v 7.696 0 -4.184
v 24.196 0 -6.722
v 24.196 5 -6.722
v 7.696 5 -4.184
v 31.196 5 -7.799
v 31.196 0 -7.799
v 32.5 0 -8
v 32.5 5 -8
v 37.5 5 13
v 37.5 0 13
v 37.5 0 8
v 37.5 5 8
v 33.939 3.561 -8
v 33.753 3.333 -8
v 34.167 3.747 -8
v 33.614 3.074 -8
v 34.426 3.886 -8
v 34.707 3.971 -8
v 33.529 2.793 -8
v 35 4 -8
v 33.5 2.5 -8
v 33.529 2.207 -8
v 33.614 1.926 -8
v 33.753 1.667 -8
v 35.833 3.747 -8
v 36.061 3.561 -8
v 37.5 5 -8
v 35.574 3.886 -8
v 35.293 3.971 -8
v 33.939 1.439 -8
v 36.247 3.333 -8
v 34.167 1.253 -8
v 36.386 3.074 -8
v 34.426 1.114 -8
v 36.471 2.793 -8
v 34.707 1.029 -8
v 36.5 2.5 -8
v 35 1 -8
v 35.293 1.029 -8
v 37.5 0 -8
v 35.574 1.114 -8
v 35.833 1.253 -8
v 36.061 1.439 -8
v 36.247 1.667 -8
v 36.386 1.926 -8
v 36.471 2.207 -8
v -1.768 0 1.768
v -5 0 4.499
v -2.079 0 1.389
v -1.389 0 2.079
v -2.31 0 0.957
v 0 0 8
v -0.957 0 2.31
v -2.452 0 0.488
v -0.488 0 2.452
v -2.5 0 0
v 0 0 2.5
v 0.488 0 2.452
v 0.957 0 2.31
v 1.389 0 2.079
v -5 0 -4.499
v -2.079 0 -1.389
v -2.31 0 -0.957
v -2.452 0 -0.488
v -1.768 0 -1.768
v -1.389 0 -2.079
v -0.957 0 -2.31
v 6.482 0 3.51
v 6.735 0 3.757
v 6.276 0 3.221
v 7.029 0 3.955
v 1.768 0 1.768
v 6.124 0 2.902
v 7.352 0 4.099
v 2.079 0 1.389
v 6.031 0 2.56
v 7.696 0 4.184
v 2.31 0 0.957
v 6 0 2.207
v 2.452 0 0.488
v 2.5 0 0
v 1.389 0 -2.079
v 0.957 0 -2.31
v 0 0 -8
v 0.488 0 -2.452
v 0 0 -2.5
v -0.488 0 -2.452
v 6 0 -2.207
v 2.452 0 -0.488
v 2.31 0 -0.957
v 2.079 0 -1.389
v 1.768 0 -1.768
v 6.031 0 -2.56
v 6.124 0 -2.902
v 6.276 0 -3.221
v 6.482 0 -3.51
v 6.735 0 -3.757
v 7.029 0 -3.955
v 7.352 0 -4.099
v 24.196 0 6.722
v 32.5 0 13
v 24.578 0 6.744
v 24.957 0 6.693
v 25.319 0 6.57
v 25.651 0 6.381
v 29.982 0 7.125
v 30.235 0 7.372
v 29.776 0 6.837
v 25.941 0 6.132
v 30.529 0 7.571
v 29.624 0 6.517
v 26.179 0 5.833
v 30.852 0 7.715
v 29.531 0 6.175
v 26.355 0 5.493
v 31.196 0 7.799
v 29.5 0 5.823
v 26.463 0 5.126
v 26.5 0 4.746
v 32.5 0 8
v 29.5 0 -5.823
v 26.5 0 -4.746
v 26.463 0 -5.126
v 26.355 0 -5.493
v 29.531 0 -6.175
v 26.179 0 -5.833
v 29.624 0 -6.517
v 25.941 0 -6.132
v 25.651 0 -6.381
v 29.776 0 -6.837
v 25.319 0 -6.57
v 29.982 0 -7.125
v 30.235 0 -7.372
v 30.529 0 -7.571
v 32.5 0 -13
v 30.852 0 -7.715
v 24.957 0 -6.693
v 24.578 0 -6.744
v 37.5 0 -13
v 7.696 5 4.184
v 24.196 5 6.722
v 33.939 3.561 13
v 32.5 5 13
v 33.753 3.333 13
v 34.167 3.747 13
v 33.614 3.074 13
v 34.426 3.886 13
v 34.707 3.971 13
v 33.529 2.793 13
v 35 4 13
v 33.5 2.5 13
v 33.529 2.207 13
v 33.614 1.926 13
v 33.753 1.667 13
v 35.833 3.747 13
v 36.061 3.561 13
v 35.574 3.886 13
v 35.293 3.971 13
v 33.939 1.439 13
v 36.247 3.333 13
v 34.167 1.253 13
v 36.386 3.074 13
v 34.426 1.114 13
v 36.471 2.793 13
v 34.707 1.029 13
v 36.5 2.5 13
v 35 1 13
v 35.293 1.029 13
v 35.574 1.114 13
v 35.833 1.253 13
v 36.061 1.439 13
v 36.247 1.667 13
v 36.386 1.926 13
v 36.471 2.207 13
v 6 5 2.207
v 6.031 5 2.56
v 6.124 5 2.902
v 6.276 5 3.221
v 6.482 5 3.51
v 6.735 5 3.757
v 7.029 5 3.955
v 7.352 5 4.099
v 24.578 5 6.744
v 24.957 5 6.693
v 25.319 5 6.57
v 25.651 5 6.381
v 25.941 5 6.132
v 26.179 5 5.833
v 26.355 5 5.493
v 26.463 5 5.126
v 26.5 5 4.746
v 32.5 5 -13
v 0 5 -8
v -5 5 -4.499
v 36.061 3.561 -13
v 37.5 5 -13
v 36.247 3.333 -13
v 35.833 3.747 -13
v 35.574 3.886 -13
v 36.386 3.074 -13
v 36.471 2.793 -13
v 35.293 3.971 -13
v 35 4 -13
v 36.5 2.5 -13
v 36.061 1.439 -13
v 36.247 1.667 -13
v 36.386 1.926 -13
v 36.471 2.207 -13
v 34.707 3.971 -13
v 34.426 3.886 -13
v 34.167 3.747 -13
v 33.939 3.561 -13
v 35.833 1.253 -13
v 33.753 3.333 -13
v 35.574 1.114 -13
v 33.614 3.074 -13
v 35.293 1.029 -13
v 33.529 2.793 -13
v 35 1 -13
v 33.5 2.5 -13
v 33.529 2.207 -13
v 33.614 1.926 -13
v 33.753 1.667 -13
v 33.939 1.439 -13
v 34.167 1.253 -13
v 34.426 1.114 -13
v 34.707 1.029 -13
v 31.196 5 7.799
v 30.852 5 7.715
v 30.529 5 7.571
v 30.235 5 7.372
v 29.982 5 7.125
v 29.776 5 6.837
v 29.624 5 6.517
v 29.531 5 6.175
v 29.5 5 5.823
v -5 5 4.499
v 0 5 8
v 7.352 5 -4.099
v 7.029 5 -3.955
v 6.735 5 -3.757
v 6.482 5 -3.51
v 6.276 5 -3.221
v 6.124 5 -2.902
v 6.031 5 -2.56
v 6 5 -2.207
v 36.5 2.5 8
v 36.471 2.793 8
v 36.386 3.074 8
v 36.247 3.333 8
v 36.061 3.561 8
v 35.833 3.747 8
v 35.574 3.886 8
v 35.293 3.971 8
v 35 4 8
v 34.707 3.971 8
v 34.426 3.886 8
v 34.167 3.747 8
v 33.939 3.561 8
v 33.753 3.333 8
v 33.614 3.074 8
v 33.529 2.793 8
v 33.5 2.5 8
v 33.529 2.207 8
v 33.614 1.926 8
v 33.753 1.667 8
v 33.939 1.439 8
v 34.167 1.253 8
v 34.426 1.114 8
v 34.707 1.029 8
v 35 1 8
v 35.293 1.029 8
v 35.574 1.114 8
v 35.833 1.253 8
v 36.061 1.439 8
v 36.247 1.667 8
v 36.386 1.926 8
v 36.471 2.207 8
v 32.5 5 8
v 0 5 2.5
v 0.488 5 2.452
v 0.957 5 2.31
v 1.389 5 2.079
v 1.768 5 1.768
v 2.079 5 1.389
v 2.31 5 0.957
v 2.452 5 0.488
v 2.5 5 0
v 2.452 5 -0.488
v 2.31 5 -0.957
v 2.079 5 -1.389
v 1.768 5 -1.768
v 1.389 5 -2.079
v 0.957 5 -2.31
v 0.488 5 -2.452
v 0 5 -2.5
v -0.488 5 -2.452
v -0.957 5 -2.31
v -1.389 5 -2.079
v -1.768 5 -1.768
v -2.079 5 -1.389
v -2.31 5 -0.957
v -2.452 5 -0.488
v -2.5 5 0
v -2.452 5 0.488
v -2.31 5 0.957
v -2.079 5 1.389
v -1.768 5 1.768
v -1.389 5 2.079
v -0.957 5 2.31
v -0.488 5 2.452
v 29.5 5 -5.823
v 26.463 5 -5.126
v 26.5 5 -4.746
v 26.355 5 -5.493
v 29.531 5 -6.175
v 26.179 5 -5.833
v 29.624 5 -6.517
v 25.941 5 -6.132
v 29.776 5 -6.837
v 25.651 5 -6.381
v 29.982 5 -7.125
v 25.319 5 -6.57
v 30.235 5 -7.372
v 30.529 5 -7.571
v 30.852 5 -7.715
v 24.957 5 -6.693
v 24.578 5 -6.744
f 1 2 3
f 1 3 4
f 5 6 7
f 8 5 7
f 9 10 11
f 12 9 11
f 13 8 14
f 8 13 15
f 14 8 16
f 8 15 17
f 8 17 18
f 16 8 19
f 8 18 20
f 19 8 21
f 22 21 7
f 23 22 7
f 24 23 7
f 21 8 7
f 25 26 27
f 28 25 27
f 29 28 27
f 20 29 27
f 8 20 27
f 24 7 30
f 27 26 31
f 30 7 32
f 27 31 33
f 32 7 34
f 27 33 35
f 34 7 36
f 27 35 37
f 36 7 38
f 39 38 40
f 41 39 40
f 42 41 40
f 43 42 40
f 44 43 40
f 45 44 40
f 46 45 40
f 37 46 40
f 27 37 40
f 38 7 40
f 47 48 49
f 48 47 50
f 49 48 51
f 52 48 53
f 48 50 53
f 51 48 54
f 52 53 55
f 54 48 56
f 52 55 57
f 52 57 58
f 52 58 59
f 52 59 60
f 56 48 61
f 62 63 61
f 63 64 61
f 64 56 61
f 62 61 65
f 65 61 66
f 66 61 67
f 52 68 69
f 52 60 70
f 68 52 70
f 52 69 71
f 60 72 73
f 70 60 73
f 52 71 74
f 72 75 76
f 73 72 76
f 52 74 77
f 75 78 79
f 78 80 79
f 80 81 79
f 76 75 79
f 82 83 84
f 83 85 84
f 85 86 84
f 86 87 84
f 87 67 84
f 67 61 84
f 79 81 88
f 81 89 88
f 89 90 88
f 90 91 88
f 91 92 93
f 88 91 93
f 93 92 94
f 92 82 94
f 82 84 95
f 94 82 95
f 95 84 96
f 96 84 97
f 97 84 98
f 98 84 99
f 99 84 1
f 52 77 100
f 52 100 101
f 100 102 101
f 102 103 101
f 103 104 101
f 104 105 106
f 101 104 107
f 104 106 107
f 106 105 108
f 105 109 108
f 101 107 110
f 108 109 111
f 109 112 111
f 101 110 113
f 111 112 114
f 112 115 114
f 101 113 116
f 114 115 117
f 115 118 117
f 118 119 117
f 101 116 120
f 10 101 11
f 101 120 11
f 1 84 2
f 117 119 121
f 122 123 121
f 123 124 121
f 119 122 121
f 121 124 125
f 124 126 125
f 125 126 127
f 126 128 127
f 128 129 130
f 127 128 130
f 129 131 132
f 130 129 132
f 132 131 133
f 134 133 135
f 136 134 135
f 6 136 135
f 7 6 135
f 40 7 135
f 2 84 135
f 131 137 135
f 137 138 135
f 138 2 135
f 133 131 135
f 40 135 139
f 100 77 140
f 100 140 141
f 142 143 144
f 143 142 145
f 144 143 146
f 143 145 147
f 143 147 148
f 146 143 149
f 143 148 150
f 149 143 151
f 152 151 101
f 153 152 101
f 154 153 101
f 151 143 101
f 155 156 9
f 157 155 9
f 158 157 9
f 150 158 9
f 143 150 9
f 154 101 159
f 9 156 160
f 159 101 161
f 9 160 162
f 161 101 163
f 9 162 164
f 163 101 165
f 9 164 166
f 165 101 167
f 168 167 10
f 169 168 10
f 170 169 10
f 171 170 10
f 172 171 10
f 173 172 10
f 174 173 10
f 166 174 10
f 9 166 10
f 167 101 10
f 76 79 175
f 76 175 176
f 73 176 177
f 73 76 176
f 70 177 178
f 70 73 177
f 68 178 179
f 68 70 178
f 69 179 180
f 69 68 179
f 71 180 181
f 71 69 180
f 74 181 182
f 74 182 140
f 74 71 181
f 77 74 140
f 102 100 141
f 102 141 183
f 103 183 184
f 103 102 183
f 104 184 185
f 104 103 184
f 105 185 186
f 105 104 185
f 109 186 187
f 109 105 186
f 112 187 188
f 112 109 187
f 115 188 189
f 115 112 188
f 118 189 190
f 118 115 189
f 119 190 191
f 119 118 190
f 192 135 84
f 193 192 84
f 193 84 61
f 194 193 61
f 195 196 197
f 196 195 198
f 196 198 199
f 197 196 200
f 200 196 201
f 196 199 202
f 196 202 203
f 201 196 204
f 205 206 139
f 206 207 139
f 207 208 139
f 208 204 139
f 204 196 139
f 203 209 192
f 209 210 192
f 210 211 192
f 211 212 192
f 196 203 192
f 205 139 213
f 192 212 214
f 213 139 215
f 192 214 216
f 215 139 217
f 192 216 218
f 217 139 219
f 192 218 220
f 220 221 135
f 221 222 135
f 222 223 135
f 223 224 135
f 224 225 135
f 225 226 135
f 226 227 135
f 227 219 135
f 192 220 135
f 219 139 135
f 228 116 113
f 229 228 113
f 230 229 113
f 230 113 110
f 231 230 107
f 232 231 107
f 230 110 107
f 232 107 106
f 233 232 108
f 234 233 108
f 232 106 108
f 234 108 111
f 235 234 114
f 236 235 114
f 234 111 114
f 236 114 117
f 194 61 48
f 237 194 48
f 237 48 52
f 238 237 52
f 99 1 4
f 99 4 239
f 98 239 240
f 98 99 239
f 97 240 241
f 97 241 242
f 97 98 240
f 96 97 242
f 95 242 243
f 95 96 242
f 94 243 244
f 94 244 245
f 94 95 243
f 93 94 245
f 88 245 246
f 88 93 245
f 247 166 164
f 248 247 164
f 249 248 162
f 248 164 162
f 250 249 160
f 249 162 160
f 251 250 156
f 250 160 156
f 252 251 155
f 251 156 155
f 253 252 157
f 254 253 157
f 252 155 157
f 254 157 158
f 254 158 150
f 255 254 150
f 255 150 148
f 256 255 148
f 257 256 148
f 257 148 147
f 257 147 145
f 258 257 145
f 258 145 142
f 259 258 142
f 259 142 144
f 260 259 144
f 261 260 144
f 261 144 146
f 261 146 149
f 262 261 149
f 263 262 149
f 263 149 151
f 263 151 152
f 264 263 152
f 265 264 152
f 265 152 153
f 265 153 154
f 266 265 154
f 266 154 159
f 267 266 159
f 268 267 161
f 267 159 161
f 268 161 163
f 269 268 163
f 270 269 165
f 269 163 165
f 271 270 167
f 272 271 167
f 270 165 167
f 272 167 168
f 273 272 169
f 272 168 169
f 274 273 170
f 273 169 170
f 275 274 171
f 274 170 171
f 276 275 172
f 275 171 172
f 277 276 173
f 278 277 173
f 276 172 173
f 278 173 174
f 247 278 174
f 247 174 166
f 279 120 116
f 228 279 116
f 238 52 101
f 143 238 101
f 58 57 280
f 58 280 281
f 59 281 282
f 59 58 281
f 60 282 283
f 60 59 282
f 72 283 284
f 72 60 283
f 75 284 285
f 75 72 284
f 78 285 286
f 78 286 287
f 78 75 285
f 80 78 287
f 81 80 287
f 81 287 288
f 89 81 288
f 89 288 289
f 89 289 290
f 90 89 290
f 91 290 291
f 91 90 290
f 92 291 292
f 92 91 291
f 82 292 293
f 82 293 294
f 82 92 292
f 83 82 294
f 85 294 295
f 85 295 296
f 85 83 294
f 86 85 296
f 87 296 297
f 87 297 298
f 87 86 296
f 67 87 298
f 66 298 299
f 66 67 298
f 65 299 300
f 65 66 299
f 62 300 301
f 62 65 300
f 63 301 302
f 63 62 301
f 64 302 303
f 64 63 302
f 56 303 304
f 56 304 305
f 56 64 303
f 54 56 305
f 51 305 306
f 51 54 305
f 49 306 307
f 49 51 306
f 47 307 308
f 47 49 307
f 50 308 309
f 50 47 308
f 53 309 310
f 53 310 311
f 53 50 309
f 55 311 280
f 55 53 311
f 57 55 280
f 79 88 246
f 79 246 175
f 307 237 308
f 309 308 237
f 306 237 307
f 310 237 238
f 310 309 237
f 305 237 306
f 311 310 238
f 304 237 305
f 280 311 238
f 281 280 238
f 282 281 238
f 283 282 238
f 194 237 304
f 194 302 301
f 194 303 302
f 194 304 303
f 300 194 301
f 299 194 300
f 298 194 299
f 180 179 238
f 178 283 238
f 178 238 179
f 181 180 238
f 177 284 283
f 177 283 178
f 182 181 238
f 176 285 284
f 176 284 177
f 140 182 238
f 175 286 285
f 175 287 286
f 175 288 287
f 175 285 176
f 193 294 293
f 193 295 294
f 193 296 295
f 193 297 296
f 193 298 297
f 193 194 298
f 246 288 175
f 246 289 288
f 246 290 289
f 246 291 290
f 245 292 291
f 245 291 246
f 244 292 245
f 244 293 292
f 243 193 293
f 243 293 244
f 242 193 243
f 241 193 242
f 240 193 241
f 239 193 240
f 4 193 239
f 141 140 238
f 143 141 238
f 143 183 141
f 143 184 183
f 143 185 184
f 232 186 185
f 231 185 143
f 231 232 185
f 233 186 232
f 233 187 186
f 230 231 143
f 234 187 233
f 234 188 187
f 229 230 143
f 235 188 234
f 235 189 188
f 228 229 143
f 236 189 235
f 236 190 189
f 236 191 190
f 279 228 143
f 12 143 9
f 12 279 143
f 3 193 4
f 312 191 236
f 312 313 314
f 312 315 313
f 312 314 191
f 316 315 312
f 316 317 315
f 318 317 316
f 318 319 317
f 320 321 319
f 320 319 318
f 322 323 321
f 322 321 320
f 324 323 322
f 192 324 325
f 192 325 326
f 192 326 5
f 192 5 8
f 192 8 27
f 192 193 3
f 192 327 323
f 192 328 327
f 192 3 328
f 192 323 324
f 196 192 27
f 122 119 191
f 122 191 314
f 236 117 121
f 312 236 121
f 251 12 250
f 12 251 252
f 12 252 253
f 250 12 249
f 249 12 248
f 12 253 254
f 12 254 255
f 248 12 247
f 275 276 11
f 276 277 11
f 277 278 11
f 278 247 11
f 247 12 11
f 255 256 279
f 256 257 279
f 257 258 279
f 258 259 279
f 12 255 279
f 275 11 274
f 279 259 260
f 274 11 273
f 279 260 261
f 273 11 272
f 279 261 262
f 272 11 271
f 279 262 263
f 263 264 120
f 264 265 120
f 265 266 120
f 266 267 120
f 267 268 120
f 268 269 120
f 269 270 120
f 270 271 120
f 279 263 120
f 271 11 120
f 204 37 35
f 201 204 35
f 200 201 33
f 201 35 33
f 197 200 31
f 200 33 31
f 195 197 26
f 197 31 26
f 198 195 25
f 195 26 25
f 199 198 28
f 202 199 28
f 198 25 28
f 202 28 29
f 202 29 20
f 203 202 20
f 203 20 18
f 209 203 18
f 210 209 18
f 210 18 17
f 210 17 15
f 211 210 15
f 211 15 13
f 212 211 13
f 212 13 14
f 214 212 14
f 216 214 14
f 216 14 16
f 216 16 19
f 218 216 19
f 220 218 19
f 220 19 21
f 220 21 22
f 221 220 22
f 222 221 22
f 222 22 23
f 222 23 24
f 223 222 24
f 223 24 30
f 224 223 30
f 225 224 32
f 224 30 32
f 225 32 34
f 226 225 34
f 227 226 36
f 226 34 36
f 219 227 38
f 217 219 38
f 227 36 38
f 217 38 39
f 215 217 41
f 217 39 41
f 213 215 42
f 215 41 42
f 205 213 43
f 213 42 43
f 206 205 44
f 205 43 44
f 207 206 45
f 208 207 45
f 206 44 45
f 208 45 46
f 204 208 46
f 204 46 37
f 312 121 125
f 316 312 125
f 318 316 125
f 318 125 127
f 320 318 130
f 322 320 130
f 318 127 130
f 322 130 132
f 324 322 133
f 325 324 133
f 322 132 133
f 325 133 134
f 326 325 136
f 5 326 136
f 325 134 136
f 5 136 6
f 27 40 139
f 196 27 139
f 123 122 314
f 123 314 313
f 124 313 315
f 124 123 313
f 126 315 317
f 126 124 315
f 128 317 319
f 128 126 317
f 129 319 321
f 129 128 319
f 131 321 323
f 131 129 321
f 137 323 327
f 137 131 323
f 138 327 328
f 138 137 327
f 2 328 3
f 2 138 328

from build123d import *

# Parameters (mm, degrees)
SKETCH1_R           = 2.5
BOSS_EXTRUDE1_DEPTH = 5
SKETCH2_R           = 1.5
CUT_EXTRUDE1_DEPTH  = 46.904792778


with BuildPart() as part:
    # Sketch1 → Boss-Extrude1 (new body)
    with BuildSketch(Plane(origin=(0, 0, 0), x_dir=(1, 0, 0), z_dir=(0, 1, 0))):
        with BuildLine():
            Line((0, 8), (-5, 4.498962309))
            Line((-5, 4.498962309), (-5, -4.498962309))
            Line((-5, -4.498962309), (0, -8))
            Line((0, -8), (32.5, -13))
            Line((32.5, -13), (37.5, -13))
            Line((37.5, -13), (37.5, -8))
            Line((37.5, -8), (32.5, -8))
            Line((32.5, -8), (31.195885631, -7.79936702))
            ThreePointArc((31.195885631, -7.79936702), (29.98206905, -7.124885362), (29.5, -5.822623625))
            Line((29.5, -5.822623625), (29.5, 5.822623625))
            ThreePointArc((29.5, 5.822623625), (29.98206905, 7.124885362), (31.195885631, 7.79936702))
            Line((31.195885631, 7.79936702), (32.5, 8))
            Line((32.5, 8), (37.5, 8))
            Line((37.5, 8), (37.5, 13))
            Line((37.5, 13), (32.5, 13))
            Line((32.5, 13), (0, 8))
        make_face()
        with Locations(Location((0, 0, 0), (0, 0, 270))):
            Circle(SKETCH1_R, mode=Mode.SUBTRACT)
        with BuildLine():
            Line((6, 2.20723901), (6, -2.20723901))
            ThreePointArc((6, -2.20723901), (6.48206905, -3.509500746), (7.695885631, -4.183982405))
            Line((7.695885631, -4.183982405), (24.195885631, -6.722443943))
            ThreePointArc((24.195885631, -6.722443943), (25.802261737, -6.263631498), (26.5, -4.745700548))
            Line((26.5, -4.745700548), (26.5, 4.745700548))
            ThreePointArc((26.5, 4.745700548), (25.802261737, 6.263631498), (24.195885631, 6.722443943))
            Line((24.195885631, 6.722443943), (7.695885631, 4.183982405))
            ThreePointArc((7.695885631, 4.183982405), (6.48206905, 3.509500746), (6, 2.20723901))
        make_face(mode=Mode.SUBTRACT)
    extrude(amount=BOSS_EXTRUDE1_DEPTH)

    # Sketch2 → Cut-Extrude1 (cut, through all)
    with BuildSketch(Plane.XY.offset(13)):
        with Locations((35, 2.5)):
            Circle(SKETCH2_R)
    extrude(amount=-CUT_EXTRUDE1_DEPTH, mode=Mode.SUBTRACT)


solid = part.part
